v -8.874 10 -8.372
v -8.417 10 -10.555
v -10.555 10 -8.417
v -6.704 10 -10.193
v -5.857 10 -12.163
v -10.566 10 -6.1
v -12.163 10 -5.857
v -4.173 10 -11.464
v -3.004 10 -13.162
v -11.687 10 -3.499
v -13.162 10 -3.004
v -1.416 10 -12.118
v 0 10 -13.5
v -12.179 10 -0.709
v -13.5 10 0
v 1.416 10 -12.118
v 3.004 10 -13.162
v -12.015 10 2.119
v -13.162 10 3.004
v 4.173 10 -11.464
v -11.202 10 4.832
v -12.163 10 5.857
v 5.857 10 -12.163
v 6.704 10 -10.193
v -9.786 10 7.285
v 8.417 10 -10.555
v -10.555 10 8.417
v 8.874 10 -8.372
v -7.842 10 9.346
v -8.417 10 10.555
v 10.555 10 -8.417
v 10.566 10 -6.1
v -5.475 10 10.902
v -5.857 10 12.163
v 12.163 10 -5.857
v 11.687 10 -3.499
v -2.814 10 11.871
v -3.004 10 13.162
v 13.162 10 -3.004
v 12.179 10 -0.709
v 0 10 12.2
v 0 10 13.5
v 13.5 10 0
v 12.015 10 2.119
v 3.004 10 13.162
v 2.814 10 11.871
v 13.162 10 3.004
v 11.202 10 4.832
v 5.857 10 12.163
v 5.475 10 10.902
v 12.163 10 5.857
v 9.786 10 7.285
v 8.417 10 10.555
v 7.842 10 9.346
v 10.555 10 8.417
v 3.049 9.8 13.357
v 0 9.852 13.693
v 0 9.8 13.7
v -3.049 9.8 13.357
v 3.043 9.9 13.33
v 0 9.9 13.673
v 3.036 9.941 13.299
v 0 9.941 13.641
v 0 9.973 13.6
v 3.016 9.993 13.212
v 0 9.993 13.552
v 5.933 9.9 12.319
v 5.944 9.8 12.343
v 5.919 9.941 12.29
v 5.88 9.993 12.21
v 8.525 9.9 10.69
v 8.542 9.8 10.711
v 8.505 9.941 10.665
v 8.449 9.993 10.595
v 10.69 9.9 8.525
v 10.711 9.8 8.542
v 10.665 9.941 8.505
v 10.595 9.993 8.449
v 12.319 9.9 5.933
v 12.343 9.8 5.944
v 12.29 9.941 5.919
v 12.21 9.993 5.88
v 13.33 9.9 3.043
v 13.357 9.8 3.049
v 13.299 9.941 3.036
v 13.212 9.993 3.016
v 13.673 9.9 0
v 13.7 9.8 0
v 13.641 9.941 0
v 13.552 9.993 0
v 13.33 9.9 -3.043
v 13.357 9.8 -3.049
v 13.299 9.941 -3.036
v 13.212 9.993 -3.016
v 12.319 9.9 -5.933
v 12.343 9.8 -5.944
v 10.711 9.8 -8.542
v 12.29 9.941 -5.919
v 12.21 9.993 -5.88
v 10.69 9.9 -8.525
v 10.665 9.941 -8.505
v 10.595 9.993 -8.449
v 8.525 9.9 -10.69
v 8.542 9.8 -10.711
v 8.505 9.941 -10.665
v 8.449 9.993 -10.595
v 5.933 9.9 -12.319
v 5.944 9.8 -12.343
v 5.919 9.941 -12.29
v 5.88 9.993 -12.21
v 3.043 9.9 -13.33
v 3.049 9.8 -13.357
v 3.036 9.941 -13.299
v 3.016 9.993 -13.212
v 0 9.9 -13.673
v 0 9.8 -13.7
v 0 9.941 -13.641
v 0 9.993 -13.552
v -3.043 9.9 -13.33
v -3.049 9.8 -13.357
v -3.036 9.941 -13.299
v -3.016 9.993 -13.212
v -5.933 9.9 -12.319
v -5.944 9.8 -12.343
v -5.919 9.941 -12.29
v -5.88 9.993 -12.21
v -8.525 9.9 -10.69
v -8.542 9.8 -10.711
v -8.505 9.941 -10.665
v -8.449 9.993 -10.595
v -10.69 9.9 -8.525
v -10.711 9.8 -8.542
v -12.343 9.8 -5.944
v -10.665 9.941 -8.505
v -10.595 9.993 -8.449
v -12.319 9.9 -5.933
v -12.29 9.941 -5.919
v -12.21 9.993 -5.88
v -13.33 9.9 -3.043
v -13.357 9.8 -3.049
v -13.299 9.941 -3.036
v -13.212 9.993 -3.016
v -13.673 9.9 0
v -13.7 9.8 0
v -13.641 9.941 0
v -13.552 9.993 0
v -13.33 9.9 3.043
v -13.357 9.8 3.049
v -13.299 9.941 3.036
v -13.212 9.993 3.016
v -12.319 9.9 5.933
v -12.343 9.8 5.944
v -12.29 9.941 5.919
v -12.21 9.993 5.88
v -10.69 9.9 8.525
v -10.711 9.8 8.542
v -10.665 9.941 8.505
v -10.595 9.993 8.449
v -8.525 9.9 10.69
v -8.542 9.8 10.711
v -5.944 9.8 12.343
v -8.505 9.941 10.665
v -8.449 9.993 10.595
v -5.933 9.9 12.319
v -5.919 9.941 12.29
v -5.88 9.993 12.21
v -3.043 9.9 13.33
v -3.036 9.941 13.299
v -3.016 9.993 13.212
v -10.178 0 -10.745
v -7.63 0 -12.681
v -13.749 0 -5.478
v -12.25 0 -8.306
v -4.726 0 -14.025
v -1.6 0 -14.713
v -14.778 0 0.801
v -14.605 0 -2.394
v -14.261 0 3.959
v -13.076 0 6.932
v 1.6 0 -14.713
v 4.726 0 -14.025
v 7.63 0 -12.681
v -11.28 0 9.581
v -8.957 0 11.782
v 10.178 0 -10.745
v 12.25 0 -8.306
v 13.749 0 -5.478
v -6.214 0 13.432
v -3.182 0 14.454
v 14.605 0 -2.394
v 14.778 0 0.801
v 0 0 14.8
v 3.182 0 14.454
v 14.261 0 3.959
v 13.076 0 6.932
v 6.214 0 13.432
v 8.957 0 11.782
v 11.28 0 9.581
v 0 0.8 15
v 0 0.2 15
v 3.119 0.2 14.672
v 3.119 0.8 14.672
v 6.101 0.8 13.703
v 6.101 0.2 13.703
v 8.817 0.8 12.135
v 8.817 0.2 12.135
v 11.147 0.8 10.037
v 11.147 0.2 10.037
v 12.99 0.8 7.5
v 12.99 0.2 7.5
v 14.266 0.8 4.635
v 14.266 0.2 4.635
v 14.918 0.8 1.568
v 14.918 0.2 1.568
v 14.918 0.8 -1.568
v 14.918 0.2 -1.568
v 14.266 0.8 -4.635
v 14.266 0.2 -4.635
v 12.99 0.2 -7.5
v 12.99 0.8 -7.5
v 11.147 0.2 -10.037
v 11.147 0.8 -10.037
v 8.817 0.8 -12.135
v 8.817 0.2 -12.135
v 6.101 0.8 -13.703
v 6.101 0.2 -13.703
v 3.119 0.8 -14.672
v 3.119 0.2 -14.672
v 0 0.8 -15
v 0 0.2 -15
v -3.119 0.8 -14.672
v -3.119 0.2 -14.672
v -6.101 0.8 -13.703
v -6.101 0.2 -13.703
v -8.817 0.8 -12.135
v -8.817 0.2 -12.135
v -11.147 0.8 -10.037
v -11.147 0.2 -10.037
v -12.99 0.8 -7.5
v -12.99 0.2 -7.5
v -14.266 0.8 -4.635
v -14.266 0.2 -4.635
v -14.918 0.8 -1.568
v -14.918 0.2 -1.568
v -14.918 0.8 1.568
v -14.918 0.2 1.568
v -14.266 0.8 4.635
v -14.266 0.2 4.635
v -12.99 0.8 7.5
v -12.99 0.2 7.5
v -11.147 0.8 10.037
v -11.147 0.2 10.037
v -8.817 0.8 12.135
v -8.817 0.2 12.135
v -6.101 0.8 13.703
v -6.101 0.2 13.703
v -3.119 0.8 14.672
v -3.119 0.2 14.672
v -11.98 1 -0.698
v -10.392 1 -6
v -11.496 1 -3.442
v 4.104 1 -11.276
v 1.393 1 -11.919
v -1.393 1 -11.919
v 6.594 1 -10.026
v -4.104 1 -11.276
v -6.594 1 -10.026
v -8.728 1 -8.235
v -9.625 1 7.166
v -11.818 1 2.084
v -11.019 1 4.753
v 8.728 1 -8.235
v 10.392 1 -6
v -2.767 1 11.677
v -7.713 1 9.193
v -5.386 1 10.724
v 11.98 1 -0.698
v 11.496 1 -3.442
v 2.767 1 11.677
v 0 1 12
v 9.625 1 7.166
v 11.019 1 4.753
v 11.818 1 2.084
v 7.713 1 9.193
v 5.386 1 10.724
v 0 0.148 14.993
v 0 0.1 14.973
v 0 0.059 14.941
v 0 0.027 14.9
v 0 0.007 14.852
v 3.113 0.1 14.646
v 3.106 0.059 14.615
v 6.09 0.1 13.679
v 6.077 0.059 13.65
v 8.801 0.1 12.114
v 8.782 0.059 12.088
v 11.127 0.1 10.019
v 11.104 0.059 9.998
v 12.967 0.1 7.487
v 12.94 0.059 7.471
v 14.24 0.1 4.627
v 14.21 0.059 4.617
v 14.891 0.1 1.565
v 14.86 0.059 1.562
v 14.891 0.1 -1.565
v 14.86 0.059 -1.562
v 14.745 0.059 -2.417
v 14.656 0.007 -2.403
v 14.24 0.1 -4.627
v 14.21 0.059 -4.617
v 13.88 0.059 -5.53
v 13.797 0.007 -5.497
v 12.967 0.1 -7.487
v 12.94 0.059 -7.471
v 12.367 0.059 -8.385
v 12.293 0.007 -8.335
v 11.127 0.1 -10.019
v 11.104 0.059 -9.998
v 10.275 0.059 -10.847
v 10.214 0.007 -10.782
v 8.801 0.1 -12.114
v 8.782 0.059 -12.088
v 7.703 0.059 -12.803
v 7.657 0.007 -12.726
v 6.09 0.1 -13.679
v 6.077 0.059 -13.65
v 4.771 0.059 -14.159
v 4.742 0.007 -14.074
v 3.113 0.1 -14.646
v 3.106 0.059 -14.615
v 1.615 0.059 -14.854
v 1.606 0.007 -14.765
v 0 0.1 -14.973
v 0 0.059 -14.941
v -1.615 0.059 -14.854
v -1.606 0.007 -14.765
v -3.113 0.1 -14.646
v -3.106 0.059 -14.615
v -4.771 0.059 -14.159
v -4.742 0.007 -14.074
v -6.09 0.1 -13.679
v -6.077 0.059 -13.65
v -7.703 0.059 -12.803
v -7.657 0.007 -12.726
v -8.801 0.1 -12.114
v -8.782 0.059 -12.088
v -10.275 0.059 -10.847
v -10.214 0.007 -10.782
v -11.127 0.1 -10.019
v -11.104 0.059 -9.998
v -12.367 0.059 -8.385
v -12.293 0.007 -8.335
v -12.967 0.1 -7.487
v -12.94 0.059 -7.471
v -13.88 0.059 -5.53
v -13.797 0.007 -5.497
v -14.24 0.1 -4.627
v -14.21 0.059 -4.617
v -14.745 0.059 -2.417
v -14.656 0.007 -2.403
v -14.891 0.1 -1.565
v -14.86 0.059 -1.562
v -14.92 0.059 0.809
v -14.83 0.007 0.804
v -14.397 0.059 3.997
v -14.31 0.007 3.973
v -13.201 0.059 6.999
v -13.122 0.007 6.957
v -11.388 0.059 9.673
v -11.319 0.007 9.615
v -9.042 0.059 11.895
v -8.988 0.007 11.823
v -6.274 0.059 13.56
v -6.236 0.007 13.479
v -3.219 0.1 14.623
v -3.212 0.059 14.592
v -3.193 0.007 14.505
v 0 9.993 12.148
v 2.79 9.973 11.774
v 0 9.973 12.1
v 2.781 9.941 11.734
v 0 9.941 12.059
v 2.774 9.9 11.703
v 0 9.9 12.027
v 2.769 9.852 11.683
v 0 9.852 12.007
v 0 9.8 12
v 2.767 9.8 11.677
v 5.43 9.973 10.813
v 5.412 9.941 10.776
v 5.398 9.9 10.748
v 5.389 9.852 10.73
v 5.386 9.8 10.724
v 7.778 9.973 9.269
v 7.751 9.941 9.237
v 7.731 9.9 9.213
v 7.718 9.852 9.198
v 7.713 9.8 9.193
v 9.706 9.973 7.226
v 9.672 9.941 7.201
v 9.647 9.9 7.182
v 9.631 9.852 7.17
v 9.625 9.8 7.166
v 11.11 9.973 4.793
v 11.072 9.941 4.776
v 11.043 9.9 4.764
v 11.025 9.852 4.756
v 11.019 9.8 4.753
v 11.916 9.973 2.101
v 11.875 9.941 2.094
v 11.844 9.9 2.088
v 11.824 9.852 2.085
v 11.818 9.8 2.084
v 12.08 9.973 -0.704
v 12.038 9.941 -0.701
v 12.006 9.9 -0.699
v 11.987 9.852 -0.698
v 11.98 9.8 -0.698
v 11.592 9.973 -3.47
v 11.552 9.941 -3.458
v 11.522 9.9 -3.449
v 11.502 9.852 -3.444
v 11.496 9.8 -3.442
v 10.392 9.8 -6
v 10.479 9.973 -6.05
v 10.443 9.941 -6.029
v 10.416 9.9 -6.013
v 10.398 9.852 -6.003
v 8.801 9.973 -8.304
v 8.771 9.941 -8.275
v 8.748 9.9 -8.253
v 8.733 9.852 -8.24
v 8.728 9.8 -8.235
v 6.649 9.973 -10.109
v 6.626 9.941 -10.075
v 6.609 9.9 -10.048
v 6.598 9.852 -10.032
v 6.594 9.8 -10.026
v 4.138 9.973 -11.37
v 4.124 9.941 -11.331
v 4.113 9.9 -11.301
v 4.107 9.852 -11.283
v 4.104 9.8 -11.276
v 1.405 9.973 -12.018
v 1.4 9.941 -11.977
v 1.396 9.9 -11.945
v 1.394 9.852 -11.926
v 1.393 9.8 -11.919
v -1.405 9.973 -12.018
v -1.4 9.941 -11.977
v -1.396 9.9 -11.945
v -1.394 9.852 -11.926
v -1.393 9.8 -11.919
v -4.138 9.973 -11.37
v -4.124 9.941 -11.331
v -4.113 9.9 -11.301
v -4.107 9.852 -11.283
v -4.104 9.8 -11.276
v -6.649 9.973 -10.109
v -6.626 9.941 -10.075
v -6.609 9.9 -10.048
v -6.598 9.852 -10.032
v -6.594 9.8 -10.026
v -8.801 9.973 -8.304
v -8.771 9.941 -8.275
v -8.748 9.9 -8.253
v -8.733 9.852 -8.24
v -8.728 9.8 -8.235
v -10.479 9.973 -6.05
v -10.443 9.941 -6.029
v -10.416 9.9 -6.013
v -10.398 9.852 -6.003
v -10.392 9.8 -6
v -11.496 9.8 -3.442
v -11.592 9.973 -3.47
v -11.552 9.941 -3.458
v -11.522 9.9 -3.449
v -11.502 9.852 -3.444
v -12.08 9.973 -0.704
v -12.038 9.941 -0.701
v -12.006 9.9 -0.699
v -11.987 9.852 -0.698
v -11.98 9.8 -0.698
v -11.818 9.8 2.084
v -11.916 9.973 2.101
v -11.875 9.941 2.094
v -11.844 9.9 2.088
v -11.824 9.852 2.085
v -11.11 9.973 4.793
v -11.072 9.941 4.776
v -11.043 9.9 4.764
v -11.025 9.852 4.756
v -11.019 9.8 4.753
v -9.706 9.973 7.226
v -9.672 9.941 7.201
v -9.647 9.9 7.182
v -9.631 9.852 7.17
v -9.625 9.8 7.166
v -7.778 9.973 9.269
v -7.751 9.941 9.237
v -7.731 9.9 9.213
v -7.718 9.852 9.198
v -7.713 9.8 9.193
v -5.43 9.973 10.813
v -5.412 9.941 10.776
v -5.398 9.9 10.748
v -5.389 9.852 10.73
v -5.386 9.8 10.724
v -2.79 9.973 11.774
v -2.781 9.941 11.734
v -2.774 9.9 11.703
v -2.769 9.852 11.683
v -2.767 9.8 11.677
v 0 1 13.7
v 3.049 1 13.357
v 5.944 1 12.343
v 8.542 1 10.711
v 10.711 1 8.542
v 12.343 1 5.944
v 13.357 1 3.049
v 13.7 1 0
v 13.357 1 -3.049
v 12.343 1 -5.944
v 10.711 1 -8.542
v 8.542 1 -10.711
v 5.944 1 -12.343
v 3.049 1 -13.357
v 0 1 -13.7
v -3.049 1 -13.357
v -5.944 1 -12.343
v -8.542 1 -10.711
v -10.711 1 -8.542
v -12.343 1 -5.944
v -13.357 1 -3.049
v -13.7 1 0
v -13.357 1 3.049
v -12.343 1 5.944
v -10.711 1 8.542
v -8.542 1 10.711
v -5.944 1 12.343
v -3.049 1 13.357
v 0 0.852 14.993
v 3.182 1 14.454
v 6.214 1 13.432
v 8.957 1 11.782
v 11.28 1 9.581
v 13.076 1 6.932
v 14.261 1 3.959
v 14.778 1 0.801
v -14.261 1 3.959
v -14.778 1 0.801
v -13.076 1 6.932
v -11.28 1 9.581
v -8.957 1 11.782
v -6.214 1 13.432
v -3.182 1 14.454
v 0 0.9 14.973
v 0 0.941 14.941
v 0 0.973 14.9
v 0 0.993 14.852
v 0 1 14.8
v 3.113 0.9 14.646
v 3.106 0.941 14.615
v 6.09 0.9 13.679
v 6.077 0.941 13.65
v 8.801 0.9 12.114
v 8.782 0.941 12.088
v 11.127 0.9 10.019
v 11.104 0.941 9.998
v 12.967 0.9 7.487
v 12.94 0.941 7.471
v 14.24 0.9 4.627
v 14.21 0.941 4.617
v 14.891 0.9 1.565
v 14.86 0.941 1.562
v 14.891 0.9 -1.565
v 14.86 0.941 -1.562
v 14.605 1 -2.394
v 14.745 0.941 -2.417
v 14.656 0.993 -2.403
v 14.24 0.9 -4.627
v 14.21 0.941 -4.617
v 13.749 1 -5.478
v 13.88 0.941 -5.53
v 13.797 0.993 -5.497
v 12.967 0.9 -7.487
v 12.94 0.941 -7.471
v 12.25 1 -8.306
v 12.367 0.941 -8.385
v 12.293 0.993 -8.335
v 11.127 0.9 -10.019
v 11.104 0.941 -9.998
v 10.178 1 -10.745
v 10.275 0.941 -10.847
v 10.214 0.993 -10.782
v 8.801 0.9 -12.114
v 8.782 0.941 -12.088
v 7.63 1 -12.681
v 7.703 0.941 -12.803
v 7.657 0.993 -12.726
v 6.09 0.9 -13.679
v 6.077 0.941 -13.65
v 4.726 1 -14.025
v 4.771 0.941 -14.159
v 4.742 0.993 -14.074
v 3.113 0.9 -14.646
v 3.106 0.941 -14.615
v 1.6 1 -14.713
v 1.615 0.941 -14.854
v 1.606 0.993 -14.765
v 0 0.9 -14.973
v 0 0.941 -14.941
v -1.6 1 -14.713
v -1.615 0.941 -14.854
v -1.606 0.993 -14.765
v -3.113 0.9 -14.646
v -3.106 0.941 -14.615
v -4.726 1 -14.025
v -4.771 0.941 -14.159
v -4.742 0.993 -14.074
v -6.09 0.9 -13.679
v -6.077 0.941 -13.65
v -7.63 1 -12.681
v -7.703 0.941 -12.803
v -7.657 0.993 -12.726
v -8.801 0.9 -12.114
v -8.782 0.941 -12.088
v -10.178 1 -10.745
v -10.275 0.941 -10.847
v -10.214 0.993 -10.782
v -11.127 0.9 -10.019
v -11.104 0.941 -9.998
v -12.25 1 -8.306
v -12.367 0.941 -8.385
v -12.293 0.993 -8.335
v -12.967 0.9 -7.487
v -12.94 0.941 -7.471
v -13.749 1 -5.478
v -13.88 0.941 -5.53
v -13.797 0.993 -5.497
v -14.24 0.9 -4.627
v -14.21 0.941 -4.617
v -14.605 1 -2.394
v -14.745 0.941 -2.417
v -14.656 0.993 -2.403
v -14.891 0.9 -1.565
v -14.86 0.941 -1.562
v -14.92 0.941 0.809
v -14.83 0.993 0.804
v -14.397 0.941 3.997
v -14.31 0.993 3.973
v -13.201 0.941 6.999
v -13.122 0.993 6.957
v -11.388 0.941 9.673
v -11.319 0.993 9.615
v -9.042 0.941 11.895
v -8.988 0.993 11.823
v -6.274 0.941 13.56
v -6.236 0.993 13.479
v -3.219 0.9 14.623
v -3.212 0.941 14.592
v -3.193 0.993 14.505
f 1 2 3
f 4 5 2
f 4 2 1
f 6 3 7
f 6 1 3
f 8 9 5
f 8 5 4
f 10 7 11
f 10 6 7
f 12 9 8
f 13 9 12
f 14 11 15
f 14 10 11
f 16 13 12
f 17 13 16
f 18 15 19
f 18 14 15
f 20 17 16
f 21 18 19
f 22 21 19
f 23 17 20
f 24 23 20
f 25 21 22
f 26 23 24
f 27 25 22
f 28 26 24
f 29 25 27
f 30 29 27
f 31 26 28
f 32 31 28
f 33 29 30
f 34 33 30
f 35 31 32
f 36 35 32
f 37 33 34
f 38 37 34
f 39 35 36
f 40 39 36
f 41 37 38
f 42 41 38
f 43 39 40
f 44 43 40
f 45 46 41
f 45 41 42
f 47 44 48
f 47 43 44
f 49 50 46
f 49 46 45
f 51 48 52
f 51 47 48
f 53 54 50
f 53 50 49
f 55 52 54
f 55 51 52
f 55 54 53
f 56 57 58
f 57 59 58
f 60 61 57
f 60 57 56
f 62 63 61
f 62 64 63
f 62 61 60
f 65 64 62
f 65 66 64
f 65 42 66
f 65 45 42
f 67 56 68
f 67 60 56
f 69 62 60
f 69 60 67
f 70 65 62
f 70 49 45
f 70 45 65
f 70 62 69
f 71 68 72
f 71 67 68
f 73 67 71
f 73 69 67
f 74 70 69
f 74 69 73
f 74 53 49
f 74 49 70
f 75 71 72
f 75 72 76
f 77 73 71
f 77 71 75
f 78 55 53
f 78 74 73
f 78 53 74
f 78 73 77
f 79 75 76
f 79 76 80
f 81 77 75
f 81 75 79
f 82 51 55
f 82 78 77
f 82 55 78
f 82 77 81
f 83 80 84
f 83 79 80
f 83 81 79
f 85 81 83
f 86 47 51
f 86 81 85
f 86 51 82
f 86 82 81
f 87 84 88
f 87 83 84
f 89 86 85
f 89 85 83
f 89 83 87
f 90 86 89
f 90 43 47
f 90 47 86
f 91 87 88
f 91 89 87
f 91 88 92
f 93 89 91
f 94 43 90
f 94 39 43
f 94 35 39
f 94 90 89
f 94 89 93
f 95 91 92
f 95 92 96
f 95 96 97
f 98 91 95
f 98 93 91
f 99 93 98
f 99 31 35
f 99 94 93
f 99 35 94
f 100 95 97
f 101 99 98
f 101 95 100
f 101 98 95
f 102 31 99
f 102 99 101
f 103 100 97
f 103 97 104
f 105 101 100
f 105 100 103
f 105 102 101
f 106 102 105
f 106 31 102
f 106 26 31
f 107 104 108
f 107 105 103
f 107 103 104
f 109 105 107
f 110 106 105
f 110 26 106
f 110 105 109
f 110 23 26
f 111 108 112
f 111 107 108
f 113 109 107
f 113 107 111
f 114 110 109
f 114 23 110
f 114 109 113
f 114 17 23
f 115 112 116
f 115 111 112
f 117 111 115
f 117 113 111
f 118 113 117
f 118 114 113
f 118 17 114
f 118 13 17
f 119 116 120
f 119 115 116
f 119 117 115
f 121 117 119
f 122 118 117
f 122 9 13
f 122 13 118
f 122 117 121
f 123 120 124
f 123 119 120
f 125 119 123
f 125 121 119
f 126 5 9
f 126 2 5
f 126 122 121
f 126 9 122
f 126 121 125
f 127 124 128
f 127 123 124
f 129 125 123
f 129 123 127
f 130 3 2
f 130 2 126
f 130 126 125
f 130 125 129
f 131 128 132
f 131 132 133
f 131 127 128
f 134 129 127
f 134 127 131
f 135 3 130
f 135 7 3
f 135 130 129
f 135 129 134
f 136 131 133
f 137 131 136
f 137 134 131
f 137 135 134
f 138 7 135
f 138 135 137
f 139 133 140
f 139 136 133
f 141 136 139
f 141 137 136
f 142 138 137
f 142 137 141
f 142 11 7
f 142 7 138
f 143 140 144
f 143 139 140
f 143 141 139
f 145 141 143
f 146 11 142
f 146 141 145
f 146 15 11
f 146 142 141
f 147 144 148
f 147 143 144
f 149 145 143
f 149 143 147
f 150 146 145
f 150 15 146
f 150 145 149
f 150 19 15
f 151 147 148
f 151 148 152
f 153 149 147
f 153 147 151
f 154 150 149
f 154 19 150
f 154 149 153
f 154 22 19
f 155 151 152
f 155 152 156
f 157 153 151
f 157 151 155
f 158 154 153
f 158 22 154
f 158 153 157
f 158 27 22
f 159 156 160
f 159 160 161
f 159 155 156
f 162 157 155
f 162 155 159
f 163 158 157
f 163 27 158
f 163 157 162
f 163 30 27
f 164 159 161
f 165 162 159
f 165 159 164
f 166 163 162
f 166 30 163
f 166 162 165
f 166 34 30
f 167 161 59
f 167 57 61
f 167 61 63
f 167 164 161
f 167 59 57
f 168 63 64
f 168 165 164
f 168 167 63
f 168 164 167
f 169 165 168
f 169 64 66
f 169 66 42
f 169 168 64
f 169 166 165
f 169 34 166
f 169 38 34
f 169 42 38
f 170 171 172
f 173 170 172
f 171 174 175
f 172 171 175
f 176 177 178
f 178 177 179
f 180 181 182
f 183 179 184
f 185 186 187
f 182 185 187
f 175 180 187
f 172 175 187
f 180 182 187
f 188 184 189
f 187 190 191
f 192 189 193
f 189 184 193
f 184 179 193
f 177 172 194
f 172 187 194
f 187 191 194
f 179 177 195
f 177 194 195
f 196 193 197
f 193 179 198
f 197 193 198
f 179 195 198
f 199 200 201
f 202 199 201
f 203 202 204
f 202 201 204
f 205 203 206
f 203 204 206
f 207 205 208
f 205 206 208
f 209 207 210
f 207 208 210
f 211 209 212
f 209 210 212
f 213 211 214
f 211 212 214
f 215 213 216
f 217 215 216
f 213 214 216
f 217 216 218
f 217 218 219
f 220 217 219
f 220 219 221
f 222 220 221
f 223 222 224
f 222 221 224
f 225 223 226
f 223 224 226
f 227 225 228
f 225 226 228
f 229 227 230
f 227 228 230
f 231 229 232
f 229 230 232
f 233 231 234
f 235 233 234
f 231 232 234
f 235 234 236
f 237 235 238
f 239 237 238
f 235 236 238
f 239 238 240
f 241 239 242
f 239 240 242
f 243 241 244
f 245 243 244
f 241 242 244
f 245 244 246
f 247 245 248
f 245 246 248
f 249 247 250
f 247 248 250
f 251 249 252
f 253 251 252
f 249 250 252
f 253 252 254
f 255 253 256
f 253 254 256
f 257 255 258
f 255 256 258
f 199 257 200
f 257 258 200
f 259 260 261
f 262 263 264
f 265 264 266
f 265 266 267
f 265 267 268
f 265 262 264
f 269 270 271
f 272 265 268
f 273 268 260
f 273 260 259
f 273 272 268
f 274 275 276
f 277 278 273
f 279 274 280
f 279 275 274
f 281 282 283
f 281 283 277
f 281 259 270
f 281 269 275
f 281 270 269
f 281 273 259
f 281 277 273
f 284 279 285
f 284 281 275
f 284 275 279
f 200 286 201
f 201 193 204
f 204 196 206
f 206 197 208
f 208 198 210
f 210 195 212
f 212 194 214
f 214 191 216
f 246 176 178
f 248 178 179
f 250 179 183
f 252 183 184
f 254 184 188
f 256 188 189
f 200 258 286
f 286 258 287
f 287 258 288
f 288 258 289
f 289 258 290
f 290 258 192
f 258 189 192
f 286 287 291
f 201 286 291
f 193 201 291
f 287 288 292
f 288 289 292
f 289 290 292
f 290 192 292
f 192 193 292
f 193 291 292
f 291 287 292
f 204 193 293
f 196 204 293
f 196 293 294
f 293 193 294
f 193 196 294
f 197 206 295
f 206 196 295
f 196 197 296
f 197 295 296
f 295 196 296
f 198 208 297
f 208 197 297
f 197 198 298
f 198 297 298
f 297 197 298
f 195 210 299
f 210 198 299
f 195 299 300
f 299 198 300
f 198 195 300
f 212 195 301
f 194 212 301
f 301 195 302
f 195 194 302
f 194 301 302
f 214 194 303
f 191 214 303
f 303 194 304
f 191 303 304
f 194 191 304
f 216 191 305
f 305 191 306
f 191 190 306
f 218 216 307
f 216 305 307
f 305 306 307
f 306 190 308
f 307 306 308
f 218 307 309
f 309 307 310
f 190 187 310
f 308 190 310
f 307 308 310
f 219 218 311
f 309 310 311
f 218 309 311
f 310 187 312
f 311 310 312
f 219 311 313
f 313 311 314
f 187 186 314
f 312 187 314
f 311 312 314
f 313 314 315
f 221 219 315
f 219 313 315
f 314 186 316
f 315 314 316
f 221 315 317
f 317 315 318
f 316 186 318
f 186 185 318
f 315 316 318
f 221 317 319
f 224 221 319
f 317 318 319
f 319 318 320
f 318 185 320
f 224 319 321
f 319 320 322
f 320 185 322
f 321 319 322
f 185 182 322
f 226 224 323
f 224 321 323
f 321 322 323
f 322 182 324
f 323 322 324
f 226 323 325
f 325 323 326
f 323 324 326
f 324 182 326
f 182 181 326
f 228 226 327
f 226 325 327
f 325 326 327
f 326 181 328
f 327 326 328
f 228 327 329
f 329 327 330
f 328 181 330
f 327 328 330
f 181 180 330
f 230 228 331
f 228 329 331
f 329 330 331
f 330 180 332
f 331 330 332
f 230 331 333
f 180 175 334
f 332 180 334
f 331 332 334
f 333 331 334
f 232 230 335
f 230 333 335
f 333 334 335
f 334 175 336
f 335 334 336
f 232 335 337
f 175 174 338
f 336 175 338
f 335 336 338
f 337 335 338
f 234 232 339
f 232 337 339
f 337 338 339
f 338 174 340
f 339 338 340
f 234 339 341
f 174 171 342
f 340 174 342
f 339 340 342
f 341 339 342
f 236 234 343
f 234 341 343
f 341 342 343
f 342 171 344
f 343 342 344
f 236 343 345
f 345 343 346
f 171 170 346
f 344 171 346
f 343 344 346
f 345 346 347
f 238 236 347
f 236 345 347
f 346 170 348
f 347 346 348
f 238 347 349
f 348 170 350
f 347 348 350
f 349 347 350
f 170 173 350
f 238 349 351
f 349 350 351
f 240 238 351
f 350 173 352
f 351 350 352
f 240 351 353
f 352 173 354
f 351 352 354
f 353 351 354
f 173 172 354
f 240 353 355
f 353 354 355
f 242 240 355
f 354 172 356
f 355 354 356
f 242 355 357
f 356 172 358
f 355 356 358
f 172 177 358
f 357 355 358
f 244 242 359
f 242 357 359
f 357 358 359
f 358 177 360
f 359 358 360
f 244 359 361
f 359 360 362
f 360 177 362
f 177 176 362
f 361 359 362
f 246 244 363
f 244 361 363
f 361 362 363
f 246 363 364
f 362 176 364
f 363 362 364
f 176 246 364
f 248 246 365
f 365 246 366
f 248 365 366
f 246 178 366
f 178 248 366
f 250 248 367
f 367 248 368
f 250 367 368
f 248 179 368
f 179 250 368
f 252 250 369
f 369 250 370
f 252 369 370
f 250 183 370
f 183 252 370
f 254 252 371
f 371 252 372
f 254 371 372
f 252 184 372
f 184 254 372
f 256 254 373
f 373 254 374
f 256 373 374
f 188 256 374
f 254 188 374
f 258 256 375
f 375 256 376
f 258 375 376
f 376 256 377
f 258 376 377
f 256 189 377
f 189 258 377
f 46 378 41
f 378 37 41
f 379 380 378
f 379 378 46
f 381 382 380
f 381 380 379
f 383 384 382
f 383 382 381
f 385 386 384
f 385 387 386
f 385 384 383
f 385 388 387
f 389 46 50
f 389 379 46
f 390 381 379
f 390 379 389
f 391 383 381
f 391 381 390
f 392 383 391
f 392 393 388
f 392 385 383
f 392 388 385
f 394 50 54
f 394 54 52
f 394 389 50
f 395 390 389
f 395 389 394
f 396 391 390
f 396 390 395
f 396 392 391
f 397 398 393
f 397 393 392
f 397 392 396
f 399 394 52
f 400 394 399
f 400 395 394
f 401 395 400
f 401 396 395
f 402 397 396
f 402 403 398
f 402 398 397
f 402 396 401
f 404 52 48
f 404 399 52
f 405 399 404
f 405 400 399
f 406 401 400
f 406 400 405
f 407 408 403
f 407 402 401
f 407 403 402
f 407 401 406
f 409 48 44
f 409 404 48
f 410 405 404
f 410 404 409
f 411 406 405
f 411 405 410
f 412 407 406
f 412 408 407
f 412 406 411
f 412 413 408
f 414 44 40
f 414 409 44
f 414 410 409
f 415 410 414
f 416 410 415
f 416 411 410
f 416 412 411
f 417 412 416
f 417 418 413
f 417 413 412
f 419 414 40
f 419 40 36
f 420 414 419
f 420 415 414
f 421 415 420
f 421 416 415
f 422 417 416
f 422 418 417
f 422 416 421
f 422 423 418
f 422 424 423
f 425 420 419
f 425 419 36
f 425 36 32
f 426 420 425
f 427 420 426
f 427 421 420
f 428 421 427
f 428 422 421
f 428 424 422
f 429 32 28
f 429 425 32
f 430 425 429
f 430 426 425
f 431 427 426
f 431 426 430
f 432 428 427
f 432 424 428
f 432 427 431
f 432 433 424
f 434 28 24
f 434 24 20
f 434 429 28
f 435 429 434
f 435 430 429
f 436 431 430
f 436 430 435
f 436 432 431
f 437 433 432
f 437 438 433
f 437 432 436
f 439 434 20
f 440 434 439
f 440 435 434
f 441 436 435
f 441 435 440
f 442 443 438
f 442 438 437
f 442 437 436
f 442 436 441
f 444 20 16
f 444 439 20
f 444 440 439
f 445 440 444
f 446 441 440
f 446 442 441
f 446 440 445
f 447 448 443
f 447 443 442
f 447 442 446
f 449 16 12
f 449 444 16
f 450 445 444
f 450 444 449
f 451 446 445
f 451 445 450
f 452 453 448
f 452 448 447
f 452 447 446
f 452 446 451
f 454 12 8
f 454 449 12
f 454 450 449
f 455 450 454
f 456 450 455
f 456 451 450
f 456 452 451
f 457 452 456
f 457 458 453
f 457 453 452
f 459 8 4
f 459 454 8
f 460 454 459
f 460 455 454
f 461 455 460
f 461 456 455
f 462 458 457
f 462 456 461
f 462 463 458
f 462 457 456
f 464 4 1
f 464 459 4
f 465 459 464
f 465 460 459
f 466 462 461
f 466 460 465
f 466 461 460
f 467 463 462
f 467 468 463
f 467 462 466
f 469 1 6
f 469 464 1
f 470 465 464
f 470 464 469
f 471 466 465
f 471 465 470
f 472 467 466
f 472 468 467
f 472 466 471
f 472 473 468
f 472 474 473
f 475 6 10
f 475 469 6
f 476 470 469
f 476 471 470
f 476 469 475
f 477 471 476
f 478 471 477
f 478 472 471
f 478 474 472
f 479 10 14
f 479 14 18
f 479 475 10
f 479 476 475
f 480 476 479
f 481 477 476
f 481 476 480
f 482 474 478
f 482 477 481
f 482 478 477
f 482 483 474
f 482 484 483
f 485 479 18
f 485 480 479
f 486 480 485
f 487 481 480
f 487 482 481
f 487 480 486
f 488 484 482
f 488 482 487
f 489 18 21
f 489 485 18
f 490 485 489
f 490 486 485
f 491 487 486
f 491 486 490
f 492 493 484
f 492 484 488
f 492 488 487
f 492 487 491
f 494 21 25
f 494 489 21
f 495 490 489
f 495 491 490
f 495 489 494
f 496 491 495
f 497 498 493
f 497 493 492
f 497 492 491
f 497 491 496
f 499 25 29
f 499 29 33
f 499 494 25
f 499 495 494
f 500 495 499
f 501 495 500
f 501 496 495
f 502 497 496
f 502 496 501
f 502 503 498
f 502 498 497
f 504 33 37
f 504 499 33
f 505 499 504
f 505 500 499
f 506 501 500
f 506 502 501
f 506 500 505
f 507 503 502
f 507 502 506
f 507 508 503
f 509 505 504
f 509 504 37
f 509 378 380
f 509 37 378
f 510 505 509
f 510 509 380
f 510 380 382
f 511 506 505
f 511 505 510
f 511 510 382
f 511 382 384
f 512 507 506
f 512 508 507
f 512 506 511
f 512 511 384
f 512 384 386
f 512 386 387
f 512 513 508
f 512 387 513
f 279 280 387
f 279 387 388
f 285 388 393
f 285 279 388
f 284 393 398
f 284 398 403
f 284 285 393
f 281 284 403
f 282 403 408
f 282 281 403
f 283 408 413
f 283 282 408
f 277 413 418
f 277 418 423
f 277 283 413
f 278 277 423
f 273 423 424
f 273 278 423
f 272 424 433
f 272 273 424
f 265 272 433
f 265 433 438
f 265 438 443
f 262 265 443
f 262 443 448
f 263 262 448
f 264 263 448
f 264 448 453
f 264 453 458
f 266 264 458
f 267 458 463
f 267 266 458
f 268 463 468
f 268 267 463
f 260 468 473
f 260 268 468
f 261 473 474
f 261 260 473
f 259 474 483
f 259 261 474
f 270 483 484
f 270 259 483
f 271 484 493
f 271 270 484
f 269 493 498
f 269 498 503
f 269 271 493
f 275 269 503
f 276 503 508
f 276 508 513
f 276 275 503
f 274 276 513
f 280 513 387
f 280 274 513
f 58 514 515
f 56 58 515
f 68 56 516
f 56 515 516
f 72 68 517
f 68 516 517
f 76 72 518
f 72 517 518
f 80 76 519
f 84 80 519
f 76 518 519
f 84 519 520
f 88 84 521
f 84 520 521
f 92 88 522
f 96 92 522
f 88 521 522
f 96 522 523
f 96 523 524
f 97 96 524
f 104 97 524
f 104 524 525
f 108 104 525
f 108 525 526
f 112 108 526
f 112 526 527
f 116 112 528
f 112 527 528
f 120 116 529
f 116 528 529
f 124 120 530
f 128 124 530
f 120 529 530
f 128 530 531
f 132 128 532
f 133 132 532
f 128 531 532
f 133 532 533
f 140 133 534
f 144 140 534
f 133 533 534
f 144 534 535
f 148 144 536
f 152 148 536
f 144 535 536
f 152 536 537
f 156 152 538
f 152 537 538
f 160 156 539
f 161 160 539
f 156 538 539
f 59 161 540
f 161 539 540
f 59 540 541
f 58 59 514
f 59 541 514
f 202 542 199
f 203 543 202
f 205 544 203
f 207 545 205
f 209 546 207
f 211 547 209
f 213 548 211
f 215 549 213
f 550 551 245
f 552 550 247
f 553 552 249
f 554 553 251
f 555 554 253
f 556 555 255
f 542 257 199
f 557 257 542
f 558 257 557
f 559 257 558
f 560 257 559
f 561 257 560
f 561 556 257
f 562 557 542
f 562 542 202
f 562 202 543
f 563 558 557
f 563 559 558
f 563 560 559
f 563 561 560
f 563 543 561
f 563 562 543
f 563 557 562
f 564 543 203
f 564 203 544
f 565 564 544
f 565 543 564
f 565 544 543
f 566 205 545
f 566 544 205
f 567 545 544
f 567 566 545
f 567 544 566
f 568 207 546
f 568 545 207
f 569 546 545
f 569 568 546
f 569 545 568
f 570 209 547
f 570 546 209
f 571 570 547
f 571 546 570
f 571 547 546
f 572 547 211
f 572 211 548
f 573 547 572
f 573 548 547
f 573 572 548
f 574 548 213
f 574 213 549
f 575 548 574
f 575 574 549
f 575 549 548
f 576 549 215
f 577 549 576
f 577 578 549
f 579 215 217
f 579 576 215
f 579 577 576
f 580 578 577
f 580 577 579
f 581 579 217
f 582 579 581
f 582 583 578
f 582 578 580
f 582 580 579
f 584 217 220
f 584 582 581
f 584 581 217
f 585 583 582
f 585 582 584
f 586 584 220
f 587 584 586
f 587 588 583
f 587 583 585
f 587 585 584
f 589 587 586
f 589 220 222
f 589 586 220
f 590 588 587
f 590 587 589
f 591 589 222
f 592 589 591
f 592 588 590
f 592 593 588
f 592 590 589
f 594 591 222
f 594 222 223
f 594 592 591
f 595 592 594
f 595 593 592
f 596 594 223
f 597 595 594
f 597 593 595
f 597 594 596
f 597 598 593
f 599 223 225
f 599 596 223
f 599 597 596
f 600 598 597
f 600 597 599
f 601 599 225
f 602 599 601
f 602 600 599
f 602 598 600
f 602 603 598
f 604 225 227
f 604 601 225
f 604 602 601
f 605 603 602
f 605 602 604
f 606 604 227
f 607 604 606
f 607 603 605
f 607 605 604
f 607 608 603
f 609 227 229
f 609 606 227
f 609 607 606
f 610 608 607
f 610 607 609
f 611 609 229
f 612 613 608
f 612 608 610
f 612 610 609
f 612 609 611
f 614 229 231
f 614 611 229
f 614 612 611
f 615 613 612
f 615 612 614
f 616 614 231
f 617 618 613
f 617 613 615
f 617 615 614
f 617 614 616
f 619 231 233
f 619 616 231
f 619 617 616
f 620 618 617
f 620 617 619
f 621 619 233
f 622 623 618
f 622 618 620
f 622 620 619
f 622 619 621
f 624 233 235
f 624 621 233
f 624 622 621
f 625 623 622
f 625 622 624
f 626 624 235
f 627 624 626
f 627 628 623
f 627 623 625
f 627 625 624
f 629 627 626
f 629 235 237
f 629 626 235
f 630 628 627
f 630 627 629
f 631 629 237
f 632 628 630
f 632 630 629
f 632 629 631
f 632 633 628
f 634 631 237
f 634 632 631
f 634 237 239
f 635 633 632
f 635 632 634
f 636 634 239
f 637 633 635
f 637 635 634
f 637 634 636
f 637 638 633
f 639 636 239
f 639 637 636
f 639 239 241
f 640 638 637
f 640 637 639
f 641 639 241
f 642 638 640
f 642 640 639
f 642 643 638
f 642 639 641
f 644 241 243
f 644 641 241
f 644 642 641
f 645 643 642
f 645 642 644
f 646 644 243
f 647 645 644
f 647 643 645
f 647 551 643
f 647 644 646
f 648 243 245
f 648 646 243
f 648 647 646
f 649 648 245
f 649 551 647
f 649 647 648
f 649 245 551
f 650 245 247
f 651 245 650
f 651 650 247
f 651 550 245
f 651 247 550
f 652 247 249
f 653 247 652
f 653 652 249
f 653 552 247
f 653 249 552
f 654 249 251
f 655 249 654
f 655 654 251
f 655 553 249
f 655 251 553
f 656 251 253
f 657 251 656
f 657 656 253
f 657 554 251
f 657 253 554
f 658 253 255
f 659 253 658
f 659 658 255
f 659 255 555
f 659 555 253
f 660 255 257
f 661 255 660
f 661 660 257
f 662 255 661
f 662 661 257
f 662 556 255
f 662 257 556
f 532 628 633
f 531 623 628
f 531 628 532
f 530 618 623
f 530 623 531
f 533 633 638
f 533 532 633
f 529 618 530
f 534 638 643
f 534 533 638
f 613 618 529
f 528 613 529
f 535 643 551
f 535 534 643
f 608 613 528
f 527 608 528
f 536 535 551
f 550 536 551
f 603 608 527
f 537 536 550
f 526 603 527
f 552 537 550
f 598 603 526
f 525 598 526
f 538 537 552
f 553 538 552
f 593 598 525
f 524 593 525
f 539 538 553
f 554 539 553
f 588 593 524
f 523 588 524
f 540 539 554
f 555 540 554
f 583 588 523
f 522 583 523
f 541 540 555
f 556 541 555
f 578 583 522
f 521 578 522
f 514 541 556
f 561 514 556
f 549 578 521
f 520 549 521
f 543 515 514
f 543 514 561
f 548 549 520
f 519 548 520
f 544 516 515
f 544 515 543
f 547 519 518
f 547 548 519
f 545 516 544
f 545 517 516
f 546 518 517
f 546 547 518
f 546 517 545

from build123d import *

# Parameters (mm, degrees)
SKETCH_1_R      = 15
EXTRUDE_1_DEPTH = 1
SKETCH_2_R      = 13.7
SKETCH_2_R_2    = 12
EXTRUDE_2_DEPTH = 9
FILLET_1_R      = 0.2


with BuildPart() as part:
    # 草图1 → 凸台-拉伸1 (new body)
    with BuildSketch(Plane(origin=(0, 0, 0), x_dir=(1, 0, 0), z_dir=(0, 1, 0))):
        with Locations(Location((0, 0, 0), (0, 0, 270))):
            Circle(SKETCH_1_R)
    extrude(amount=EXTRUDE_1_DEPTH)

    # 草图2 → 凸台-拉伸2 (add)
    with BuildSketch(Plane(origin=(0, 1, 0), x_dir=(1, 0, 0), z_dir=(0, 1, 0))):
        with Locations(Location((0, 0, 0), (0, 0, 270))):
            Circle(SKETCH_2_R)
        with Locations(Location((0, 0, 0), (0, 0, 270))):
            Circle(SKETCH_2_R_2, mode=Mode.SUBTRACT)
    extrude(amount=EXTRUDE_2_DEPTH)

    # 圆角1
    fillet_1_edges = [part.edges().sort_by_distance(p)[0] for p in [
        (0, 0, -15),
        (0, 1, -15),
        (0, 10, -13.7),
        (0, 10, -12),
    ]]
    fillet(fillet_1_edges, radius=FILLET_1_R)


solid = part.part
